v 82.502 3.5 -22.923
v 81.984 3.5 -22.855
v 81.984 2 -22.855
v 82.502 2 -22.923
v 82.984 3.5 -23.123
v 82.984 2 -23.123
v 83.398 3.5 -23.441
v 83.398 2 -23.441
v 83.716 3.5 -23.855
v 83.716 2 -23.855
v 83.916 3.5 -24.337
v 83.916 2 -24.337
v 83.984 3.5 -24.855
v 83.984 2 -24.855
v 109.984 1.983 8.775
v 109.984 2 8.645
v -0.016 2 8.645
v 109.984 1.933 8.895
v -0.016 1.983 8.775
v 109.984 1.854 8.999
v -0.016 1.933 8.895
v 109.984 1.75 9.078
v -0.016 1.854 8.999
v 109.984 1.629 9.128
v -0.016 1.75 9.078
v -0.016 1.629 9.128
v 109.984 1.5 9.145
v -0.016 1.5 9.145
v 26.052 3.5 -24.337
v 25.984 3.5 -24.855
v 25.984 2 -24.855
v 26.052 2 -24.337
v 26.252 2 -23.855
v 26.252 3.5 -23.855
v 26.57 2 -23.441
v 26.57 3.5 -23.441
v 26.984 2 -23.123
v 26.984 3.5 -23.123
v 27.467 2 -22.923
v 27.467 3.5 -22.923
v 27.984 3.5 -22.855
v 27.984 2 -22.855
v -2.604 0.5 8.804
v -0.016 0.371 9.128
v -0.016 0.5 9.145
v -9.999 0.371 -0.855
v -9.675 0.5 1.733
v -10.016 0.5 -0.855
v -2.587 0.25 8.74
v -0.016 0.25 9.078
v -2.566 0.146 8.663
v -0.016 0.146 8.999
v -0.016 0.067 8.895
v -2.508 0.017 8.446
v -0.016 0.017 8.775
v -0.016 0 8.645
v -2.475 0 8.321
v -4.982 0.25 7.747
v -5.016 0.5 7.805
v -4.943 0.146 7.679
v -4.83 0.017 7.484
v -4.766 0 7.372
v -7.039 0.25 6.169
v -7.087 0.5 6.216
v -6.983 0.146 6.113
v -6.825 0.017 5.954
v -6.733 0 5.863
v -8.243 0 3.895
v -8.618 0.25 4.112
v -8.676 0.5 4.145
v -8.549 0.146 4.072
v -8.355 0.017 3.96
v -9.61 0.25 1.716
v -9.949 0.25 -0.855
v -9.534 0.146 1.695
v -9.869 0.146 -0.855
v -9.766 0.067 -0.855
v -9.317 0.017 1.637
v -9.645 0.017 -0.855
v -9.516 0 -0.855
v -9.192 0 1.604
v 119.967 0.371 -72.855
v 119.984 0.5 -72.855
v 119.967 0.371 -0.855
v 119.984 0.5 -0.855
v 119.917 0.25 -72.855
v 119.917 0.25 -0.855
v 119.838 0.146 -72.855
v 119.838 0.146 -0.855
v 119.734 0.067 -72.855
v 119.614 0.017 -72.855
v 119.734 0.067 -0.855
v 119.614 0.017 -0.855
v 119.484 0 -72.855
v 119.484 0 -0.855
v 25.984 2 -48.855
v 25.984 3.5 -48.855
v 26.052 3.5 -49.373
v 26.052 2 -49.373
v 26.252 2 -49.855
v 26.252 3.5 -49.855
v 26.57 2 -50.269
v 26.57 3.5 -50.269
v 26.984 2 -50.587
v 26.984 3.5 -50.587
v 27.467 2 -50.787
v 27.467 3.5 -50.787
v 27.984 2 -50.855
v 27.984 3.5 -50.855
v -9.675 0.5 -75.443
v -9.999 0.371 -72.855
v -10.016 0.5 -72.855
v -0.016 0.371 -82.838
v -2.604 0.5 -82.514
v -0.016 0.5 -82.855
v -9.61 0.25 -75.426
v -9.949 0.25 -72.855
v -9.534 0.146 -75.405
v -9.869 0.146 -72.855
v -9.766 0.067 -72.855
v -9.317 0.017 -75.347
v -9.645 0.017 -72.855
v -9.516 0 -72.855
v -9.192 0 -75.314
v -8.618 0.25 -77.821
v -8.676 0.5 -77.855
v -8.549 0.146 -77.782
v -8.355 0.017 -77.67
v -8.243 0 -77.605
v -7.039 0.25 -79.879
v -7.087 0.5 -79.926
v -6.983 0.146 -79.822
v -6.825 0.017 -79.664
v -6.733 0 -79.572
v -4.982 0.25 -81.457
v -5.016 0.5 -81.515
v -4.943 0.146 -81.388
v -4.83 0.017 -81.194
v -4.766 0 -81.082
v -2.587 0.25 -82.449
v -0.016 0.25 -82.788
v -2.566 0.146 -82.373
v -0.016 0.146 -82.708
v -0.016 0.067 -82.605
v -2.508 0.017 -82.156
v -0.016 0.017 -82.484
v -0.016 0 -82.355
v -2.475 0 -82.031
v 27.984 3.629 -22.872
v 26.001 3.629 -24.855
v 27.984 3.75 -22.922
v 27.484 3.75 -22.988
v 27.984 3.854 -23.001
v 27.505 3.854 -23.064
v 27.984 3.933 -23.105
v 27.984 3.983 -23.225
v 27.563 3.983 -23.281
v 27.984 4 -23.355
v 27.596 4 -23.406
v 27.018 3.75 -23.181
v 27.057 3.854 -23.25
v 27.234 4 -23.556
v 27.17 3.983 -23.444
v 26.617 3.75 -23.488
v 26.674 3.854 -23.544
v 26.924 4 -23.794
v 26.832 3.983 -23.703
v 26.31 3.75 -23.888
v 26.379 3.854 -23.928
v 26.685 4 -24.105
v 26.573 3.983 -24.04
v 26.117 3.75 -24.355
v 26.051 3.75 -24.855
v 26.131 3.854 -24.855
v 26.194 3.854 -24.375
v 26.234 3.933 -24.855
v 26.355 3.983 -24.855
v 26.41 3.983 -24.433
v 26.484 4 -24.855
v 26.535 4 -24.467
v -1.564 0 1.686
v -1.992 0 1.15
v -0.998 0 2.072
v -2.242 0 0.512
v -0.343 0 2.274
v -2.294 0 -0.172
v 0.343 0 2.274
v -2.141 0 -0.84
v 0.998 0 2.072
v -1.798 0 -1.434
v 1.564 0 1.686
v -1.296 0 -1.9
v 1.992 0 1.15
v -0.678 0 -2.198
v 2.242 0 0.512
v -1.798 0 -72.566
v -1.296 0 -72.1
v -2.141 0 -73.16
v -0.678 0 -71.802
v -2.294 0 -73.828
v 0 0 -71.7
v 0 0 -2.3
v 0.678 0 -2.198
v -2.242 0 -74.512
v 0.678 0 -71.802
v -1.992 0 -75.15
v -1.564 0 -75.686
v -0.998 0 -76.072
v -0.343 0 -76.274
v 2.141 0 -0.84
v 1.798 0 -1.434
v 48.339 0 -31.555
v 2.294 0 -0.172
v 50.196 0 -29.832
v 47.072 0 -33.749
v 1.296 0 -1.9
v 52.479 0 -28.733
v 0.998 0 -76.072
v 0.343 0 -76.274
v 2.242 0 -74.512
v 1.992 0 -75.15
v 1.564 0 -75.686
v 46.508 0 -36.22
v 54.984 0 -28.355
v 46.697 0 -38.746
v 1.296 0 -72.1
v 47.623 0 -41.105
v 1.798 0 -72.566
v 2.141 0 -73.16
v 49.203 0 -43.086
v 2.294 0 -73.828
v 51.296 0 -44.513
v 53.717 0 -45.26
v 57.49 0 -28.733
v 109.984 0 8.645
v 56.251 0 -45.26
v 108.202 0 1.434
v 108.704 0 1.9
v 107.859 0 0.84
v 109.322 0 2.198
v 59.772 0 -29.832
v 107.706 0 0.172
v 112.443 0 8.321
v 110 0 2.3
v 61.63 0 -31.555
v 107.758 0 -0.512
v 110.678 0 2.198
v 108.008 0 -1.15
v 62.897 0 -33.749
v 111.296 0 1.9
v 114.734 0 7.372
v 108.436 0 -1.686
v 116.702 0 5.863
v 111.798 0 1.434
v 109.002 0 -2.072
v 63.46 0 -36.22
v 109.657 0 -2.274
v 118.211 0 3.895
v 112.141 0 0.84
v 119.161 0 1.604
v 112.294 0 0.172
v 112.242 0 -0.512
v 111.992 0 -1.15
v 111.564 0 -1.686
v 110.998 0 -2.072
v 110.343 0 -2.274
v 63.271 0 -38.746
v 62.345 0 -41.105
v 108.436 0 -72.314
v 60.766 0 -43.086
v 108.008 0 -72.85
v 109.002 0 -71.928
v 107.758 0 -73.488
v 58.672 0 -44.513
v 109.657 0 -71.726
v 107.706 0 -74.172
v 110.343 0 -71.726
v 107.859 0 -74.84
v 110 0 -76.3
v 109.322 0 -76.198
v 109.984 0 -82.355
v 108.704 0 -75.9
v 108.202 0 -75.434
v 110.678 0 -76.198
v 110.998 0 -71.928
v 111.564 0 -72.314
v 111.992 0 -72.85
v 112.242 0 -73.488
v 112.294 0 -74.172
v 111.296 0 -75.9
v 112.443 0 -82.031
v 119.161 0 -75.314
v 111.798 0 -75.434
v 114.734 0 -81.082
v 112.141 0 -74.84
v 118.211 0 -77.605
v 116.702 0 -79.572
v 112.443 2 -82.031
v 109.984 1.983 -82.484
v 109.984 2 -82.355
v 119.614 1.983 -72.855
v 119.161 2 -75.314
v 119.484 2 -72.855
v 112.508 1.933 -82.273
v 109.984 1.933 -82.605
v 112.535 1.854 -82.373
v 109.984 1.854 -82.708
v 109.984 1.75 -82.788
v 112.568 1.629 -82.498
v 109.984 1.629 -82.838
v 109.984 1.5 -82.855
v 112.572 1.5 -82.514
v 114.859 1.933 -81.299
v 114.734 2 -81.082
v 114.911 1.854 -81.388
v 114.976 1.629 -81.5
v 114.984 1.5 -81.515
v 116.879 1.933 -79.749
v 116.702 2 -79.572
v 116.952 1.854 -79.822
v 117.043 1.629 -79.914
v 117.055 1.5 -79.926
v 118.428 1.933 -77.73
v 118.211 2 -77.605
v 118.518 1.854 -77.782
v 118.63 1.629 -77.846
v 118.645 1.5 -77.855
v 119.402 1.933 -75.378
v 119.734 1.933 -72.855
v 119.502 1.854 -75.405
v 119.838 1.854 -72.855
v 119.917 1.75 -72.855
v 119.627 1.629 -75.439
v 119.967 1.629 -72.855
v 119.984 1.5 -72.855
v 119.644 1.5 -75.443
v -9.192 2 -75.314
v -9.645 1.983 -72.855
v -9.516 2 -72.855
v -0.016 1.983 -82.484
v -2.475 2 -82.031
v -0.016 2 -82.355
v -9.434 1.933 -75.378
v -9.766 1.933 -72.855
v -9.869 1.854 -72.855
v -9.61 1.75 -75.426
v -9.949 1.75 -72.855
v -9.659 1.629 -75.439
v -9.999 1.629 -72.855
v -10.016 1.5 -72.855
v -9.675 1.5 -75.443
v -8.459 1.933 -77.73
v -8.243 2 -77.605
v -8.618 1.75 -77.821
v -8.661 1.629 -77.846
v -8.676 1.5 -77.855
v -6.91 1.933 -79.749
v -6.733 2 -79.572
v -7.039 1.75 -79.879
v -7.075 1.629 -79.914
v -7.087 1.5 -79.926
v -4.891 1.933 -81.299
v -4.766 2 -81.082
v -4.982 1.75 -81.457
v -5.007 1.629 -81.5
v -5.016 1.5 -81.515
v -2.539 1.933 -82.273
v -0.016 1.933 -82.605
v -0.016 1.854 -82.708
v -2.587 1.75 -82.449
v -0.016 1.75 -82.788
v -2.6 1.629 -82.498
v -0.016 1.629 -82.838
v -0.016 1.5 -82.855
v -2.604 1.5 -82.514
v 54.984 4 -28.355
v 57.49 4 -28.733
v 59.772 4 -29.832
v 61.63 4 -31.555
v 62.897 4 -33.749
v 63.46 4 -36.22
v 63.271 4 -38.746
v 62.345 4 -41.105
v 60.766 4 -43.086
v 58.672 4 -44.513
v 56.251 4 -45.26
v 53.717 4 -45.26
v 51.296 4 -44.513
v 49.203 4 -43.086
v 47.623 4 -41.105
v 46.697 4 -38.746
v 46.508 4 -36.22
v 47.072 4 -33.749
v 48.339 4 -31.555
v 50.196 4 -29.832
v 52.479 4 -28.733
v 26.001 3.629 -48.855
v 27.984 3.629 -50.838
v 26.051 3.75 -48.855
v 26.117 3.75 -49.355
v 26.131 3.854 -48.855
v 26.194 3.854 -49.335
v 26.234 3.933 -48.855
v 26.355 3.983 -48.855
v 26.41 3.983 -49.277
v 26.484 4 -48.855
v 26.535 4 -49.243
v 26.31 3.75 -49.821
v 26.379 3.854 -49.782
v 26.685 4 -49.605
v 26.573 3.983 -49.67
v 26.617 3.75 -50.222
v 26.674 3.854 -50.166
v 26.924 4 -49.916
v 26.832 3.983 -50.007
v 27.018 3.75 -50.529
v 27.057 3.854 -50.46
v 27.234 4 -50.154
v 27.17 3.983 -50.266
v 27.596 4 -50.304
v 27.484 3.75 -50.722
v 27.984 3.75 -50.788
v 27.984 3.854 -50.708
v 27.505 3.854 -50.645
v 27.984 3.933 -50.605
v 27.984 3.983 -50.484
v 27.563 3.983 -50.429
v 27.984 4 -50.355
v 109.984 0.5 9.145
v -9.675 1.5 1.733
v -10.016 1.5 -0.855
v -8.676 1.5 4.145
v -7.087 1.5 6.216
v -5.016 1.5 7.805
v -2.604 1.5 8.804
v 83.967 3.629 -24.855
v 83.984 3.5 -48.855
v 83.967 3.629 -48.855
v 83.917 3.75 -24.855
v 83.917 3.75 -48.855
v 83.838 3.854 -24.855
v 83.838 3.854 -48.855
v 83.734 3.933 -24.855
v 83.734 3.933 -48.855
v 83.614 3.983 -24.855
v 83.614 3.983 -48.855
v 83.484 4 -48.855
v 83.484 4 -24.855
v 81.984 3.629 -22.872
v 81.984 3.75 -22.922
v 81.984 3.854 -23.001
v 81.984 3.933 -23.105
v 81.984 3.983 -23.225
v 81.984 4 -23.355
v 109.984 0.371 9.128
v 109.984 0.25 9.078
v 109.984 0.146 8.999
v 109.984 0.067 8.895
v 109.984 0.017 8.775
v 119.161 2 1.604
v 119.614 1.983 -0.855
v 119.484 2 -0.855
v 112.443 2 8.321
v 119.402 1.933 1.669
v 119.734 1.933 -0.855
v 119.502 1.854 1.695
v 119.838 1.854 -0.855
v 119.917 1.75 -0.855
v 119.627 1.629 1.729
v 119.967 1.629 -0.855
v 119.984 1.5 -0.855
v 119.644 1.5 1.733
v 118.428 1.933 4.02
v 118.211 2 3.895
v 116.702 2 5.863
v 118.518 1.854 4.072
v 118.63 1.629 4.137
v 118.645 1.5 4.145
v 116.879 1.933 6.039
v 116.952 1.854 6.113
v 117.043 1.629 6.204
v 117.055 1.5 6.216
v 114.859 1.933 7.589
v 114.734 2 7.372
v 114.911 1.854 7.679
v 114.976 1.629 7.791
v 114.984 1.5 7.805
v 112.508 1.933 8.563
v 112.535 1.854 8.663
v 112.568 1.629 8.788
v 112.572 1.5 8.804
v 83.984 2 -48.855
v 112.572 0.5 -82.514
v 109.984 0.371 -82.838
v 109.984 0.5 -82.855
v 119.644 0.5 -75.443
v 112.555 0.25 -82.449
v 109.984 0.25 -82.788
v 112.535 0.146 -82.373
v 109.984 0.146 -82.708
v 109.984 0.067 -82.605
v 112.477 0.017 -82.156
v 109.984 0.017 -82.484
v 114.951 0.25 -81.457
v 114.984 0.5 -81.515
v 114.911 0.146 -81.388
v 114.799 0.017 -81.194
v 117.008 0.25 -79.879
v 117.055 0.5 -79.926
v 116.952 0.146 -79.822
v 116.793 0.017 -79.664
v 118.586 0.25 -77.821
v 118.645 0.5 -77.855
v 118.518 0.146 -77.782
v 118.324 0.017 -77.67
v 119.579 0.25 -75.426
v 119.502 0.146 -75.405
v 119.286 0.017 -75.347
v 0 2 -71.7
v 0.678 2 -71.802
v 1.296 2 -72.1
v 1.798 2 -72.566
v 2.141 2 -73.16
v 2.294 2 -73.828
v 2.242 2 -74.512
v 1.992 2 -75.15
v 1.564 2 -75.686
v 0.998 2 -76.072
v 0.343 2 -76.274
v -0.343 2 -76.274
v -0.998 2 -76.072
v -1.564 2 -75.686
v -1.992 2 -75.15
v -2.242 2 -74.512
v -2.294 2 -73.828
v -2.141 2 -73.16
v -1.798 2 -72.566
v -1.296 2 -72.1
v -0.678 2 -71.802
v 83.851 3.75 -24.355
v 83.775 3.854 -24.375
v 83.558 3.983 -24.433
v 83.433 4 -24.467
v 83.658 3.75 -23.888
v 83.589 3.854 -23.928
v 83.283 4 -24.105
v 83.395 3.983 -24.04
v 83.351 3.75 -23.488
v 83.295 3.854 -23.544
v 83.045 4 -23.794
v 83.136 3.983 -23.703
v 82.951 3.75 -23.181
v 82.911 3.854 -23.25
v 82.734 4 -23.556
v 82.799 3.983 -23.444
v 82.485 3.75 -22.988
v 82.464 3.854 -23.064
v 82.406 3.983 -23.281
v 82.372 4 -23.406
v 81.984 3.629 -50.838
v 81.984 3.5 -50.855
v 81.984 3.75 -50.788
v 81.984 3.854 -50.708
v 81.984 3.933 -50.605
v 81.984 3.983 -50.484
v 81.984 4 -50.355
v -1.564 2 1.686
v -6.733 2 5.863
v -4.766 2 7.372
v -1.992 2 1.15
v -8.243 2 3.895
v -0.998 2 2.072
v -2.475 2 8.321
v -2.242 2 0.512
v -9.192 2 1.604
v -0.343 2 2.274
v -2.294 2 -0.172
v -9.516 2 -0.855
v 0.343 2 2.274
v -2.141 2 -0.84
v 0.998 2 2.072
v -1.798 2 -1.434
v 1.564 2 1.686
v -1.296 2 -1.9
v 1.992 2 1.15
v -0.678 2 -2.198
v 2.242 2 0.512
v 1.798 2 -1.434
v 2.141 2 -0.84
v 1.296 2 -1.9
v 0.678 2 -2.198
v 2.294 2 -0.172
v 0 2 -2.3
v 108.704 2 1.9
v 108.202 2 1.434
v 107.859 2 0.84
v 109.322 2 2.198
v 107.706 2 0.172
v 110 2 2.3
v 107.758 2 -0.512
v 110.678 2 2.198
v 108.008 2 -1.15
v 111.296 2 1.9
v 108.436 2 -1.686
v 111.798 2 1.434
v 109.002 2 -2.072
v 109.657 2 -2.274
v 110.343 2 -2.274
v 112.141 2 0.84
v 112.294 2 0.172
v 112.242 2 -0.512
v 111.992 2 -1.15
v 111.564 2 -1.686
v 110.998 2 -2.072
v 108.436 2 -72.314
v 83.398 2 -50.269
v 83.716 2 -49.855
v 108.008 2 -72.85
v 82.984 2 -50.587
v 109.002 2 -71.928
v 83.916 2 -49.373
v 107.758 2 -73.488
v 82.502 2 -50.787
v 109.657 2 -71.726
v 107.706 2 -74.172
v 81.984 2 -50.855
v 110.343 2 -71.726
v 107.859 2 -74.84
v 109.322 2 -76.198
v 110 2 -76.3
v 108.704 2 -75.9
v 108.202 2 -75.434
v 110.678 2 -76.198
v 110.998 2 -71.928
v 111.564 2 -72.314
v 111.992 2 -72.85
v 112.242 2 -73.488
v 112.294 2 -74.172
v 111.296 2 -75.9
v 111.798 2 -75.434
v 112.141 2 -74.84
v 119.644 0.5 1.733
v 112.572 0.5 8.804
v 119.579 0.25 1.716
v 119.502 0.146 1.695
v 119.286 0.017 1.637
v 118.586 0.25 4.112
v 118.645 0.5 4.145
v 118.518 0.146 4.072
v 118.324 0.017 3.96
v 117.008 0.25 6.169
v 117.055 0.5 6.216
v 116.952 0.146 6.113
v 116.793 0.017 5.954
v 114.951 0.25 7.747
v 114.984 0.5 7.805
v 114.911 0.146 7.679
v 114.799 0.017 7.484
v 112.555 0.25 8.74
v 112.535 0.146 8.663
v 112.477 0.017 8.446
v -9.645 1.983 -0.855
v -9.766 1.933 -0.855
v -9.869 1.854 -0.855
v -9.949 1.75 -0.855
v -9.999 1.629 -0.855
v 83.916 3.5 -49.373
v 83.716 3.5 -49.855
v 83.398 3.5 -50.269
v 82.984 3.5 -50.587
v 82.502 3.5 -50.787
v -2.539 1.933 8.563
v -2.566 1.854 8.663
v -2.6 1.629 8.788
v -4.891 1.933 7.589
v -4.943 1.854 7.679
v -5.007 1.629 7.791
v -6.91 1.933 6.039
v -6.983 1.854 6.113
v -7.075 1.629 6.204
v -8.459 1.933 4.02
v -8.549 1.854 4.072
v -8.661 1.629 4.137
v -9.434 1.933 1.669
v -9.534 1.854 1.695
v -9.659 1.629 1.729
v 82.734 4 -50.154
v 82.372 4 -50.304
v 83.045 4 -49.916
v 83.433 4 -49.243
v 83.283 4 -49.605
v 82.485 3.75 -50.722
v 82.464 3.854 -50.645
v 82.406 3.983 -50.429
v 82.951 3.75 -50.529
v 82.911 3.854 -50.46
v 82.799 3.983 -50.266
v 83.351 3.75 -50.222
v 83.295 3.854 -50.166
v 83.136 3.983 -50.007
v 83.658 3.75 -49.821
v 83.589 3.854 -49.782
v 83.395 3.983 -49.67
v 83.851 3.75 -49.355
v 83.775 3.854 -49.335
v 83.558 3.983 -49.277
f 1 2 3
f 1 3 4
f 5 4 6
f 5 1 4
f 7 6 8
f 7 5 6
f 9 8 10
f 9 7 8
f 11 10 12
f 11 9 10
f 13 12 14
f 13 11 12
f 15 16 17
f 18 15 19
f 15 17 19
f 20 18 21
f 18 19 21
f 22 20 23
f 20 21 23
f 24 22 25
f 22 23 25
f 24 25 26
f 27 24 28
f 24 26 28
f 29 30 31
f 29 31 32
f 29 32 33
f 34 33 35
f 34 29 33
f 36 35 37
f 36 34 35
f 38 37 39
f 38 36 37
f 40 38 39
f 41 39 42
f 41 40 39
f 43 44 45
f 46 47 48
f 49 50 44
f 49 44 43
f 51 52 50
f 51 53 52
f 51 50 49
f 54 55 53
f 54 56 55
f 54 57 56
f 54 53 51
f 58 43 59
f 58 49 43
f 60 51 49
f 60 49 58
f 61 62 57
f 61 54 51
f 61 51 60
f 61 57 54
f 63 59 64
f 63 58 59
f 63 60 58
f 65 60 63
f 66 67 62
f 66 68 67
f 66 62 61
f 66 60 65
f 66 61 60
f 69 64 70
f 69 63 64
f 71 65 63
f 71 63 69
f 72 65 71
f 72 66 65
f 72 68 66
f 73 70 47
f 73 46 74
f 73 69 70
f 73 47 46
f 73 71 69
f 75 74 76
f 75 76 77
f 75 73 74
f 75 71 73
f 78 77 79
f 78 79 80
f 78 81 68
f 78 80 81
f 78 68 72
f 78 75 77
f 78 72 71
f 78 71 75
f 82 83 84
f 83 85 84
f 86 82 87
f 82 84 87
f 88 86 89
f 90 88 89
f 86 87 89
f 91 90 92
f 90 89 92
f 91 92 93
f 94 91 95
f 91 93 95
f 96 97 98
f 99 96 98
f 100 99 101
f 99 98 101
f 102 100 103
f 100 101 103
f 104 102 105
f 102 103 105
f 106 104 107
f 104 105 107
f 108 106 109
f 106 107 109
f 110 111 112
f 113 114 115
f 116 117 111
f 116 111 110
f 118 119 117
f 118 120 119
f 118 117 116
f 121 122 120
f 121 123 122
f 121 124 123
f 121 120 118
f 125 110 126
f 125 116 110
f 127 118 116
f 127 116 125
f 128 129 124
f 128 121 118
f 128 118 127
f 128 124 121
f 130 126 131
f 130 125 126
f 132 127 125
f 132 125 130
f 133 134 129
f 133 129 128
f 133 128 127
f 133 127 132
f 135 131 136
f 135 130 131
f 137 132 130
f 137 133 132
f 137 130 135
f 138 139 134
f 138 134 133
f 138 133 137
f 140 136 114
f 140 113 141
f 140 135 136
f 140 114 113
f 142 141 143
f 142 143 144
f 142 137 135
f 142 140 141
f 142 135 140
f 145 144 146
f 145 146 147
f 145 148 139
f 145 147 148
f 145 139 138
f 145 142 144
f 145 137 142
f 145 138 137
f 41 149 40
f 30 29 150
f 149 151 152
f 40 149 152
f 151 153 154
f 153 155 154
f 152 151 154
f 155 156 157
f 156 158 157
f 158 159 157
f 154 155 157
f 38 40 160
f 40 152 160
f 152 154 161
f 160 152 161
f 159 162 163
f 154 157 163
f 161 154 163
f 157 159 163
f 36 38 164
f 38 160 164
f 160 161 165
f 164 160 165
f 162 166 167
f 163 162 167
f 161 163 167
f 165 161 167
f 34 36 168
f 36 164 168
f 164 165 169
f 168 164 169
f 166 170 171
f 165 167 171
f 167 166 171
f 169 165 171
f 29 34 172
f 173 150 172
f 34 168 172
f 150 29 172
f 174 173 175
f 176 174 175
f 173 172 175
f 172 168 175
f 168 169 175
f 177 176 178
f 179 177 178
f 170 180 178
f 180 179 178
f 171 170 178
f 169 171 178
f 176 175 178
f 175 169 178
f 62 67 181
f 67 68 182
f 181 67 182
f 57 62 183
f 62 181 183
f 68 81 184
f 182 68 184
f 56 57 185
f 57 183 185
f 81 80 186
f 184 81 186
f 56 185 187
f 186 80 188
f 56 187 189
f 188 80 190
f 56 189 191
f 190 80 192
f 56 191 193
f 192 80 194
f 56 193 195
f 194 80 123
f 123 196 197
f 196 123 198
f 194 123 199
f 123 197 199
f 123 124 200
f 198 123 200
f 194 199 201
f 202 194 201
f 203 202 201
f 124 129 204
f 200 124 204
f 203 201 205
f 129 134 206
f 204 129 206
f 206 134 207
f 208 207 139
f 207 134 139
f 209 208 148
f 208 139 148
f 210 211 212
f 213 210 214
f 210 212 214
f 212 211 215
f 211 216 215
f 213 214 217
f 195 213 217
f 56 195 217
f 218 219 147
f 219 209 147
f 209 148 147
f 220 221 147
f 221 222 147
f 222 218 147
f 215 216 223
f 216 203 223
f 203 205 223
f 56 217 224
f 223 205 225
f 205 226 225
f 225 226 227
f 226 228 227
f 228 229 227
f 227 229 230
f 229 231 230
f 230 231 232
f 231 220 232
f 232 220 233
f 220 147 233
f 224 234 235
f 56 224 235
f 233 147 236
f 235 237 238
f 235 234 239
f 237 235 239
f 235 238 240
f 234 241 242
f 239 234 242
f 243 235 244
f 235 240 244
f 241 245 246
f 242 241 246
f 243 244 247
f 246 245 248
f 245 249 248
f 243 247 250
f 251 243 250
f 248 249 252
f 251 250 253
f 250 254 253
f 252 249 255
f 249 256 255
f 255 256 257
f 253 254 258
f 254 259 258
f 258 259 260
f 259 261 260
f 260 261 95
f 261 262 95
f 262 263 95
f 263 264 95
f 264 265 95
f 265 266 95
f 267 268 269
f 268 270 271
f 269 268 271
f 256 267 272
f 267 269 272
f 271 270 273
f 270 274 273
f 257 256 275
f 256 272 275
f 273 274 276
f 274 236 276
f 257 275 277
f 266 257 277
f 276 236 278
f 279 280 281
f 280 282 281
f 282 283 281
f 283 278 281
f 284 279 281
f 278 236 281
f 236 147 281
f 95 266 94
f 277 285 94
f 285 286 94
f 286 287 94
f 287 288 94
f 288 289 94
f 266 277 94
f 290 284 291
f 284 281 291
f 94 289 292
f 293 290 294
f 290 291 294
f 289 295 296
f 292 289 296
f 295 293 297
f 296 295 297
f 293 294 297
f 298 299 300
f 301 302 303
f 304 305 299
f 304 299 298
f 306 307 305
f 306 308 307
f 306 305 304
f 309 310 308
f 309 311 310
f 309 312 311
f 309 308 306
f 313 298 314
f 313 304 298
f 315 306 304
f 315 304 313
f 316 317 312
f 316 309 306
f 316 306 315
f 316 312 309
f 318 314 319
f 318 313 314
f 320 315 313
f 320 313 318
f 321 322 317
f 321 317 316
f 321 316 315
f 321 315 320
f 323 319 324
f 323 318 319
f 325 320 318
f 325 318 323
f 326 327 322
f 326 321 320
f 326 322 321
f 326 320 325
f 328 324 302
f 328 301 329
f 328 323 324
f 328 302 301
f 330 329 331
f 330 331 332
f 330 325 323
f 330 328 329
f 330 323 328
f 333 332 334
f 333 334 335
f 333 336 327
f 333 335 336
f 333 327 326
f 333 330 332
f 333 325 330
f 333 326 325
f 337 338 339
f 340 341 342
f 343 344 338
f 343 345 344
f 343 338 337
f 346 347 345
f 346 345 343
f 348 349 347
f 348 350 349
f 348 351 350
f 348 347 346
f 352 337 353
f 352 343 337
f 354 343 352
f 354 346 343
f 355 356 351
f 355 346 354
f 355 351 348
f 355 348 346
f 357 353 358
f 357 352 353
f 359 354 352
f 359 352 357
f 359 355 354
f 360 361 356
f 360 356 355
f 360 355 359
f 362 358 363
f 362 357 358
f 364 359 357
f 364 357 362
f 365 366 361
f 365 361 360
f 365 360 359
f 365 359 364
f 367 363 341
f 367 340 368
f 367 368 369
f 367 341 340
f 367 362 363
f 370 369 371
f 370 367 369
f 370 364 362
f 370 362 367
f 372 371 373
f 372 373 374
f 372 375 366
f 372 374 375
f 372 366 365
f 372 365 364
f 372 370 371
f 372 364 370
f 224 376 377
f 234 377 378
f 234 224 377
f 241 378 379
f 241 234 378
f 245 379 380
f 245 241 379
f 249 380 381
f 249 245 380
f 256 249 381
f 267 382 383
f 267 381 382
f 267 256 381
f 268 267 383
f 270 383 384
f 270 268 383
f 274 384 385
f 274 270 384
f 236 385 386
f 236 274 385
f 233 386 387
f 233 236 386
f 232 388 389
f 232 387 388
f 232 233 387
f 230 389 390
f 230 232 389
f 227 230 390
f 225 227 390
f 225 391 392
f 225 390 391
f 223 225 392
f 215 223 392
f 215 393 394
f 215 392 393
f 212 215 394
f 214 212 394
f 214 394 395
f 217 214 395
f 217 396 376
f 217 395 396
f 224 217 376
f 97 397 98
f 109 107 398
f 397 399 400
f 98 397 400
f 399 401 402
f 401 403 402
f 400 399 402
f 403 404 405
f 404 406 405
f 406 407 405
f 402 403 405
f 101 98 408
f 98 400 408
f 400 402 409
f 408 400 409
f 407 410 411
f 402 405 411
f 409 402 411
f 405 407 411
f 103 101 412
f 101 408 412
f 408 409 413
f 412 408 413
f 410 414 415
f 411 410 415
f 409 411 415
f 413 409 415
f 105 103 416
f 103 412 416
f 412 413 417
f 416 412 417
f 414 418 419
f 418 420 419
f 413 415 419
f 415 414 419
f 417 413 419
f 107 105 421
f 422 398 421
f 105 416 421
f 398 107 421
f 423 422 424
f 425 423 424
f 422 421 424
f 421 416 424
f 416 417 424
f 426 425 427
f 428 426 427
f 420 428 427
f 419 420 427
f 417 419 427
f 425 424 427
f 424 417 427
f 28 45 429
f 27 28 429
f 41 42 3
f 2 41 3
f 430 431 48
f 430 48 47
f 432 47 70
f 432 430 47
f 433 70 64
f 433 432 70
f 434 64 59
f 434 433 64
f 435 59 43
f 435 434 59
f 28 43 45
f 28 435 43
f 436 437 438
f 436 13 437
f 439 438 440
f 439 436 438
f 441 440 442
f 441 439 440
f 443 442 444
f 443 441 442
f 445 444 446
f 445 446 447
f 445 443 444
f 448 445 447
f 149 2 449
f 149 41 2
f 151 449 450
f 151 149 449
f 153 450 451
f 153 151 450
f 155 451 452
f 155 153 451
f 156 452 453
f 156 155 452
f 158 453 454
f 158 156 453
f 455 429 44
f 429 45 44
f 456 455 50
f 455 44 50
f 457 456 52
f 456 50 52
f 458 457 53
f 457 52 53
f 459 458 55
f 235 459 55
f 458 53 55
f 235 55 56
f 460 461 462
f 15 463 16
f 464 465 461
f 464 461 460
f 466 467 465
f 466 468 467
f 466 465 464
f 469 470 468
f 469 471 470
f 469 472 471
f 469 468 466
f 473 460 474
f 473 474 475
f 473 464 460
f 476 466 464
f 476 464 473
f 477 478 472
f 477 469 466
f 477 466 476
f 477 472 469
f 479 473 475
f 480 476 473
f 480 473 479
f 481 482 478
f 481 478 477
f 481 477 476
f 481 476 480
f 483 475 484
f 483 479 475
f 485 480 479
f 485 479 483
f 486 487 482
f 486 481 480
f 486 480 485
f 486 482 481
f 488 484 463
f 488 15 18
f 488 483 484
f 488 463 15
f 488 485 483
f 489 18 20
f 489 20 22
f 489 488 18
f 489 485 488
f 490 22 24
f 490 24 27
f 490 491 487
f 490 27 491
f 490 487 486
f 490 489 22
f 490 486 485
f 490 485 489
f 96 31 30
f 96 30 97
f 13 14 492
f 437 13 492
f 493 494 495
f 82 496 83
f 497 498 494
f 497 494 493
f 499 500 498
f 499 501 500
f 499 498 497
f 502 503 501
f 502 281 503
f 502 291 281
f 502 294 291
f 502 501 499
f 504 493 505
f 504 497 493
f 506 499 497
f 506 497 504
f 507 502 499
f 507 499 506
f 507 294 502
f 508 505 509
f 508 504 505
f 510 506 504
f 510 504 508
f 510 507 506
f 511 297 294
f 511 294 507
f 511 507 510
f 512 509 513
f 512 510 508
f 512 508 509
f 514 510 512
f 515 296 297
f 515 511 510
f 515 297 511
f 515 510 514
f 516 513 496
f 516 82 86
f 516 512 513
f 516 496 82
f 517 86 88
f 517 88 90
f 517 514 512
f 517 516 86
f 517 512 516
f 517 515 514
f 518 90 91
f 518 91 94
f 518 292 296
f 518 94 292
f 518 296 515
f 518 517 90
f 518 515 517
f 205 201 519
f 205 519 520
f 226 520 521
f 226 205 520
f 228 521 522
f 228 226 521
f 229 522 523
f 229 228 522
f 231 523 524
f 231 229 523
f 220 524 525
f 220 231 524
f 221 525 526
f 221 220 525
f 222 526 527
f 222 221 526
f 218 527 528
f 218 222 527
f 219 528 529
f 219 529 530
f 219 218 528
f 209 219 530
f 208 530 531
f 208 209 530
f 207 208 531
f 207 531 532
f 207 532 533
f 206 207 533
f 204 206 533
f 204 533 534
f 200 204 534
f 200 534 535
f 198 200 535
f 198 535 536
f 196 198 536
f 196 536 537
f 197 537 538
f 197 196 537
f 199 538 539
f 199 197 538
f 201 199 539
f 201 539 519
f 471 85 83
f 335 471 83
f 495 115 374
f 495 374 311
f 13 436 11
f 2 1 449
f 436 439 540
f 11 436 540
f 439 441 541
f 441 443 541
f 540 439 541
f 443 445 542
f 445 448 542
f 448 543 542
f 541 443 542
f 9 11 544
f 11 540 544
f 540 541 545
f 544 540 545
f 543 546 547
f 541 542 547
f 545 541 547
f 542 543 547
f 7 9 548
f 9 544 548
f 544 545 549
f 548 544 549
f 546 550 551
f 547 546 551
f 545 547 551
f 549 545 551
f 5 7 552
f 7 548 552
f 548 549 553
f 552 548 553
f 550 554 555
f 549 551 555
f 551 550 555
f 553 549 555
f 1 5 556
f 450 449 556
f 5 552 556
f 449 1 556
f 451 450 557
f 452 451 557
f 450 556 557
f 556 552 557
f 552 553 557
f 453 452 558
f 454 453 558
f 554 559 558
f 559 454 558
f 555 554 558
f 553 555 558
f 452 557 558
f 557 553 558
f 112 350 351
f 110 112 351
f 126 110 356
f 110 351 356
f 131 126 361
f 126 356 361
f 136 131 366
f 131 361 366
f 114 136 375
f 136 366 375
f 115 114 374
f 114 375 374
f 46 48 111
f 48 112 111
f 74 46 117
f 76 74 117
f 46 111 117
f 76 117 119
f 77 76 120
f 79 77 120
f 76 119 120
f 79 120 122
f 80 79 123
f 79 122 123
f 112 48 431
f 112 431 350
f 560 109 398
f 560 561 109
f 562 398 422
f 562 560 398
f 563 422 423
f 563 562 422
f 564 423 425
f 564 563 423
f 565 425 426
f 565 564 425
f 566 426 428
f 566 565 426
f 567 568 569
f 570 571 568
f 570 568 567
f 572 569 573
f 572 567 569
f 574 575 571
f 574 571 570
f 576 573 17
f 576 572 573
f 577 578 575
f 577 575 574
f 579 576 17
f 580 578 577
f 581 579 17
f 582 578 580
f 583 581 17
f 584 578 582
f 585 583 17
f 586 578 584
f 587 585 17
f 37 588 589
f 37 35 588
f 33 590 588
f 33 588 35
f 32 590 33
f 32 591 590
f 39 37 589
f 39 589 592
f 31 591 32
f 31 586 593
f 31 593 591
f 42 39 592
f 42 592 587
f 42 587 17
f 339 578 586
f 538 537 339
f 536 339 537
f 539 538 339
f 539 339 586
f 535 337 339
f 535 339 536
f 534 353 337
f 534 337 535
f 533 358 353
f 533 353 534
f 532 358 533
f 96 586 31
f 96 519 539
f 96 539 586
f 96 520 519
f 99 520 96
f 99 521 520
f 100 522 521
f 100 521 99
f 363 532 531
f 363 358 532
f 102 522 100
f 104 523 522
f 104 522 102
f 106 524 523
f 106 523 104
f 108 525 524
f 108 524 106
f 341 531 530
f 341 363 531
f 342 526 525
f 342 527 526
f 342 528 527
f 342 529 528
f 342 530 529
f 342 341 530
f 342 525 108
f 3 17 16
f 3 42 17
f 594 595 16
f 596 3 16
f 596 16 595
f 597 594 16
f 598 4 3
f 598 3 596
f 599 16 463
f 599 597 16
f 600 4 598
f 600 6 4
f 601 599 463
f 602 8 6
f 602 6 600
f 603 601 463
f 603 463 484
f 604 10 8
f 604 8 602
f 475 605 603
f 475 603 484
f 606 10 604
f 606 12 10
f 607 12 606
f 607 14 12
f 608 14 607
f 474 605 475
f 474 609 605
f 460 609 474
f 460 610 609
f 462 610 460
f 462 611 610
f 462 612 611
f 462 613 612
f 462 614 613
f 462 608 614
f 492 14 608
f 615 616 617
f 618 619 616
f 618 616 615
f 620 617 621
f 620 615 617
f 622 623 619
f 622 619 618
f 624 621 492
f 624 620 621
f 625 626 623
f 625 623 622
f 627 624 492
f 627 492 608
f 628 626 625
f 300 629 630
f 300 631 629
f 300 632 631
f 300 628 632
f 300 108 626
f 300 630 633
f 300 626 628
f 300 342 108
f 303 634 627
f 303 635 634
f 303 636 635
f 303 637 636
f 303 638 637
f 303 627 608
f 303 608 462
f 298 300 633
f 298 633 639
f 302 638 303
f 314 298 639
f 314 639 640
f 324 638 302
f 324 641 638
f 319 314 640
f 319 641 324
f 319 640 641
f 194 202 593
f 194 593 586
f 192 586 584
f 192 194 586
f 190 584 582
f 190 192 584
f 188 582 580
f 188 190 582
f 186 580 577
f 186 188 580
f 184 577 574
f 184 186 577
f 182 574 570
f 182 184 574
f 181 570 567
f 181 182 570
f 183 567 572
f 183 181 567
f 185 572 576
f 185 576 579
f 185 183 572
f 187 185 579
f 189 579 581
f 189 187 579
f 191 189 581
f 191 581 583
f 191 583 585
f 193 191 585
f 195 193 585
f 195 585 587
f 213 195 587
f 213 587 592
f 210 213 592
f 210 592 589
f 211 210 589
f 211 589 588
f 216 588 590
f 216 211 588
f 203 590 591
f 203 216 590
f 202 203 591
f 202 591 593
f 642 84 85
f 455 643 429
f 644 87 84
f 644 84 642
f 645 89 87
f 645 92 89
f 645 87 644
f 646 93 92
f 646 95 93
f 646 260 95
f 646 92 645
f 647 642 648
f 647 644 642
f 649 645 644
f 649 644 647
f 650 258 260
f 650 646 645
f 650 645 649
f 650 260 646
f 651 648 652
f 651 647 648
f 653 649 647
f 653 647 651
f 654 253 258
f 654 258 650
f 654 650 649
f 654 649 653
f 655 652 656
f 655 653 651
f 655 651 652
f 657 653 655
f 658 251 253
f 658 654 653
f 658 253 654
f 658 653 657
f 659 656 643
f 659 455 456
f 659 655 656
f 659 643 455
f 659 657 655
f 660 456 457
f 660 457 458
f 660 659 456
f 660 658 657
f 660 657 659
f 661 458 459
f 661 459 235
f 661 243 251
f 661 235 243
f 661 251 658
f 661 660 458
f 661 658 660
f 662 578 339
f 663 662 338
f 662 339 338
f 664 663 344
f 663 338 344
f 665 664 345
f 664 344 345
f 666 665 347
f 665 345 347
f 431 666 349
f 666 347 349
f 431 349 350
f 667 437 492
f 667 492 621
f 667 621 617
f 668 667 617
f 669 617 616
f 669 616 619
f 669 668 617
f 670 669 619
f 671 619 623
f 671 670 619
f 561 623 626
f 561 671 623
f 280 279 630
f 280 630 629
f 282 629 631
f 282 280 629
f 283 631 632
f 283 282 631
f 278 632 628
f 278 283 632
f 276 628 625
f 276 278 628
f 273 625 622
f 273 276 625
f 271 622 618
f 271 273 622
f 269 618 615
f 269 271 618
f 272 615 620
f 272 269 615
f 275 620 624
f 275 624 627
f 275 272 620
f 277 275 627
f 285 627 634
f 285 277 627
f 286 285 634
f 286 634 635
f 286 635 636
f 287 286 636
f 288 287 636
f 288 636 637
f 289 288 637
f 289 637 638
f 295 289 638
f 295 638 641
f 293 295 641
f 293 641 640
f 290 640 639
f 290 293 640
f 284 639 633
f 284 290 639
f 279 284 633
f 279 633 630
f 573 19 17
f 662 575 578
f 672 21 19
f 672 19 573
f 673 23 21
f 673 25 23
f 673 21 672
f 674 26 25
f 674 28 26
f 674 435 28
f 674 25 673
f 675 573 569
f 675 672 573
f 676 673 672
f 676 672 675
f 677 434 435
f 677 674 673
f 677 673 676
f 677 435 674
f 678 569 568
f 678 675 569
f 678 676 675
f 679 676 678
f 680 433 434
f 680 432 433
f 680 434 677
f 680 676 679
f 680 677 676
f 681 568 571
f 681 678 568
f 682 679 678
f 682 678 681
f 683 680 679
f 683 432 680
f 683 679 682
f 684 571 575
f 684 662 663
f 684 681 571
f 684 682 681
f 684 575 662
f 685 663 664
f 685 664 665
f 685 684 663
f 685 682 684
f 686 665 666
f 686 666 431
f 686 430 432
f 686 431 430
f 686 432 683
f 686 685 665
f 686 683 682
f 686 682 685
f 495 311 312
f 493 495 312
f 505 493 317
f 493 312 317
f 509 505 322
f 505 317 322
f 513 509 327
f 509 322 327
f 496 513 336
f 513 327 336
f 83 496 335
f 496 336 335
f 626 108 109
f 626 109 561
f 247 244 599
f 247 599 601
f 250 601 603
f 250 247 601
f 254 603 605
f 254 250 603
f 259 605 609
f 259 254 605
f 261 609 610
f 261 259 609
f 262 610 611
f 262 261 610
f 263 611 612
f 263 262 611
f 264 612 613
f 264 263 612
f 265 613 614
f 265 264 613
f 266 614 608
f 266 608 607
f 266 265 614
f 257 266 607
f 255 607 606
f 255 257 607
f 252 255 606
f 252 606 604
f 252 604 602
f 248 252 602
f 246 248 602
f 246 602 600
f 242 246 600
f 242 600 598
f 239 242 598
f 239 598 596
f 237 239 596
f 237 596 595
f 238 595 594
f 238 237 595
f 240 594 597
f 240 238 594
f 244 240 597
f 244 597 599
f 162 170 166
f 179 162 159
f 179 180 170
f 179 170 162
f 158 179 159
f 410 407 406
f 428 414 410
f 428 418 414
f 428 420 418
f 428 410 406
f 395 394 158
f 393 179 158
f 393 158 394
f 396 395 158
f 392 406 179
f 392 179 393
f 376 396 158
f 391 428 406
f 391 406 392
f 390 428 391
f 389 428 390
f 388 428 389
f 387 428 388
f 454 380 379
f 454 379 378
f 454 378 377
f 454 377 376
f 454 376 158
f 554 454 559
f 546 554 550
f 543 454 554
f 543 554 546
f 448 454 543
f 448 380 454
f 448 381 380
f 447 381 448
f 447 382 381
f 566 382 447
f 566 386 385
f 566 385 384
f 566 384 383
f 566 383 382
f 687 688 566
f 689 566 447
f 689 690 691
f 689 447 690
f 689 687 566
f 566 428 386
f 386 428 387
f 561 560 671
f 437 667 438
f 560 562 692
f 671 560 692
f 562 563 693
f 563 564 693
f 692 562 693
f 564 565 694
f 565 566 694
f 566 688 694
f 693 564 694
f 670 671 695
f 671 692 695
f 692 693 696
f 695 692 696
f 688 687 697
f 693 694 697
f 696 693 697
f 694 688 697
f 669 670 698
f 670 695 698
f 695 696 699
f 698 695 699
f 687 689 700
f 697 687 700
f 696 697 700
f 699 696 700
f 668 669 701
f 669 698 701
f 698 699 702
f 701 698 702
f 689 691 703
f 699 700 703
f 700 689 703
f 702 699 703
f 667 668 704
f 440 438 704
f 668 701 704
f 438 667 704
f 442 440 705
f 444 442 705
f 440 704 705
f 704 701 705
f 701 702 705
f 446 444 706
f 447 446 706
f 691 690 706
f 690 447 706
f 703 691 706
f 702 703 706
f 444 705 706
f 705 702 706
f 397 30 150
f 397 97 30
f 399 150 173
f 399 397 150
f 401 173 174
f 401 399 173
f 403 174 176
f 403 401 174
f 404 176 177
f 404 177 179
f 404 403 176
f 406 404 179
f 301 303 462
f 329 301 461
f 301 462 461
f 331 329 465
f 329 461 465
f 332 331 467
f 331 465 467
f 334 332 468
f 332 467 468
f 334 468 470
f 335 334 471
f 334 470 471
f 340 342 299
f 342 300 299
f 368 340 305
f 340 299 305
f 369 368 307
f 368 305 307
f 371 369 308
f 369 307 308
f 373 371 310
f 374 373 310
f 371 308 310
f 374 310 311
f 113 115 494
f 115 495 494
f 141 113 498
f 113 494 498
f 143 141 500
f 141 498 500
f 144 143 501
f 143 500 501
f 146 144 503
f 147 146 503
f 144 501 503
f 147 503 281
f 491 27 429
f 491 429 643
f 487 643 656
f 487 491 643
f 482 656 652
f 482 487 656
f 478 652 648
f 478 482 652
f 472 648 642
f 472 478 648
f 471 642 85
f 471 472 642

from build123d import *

# Parameters (mm, degrees)
SKETCH1_W           = 130
SKETCH1_H           = 92
SKETCH1_R           = 2.3
BOSS_EXTRUDE1_DEPTH = 2
SKETCH2_W           = 58
SKETCH2_H           = 28
BOSS_EXTRUDE2_DEPTH = 4
FILLET1_R           = 10
FILLET2_R           = 2
FILLET3_R           = 0.5
SKETCH3_R           = 8.5
CUT_EXTRUDE1_DEPTH  = 146.86690412


with BuildPart() as part:
    # Sketch1 → Boss-Extrude1 (new body)
    with BuildSketch(Plane(origin=(0, 0, 0), x_dir=(1, 0, 0), z_dir=(0, 1, 0))):
        with Locations((54.9842552, 36.854886379)):
            Rectangle(SKETCH1_W, SKETCH1_H)
        with Locations(Location((0, 74, 0), (0, 0, 270))):
            Circle(SKETCH1_R, mode=Mode.SUBTRACT)
        with Locations(Location((110, 74, 0), (0, 0, 90))):
            Circle(SKETCH1_R, mode=Mode.SUBTRACT)
        with Locations(Location((110, 0, 0), (0, 0, 270))):
            Circle(SKETCH1_R, mode=Mode.SUBTRACT)
        with Locations(Location((0, 0, 0), (0, 0, 90))):
            Circle(SKETCH1_R, mode=Mode.SUBTRACT)
    extrude(amount=BOSS_EXTRUDE1_DEPTH)

    # Sketch2 → Boss-Extrude2 (add)
    with BuildSketch(Plane(origin=(0, 0, 0), x_dir=(1, 0, 0), z_dir=(0, 1, 0))):
        with Locations((54.9842552, 36.854886379)):
            Rectangle(SKETCH2_W, SKETCH2_H)
    extrude(amount=BOSS_EXTRUDE2_DEPTH)

    # Fillet1
    fillet1_edges = [part.edges().sort_by_distance(p)[0] for p in [
        (-10.0157448, 1, -82.854886379),
        (119.9842552, 1, -82.854886379),
        (119.9842552, 1, 9.145113621),
        (-10.0157448, 1, 9.145113621),
    ]]
    fillet(fillet1_edges, radius=FILLET1_R)

    # Fillet2
    fillet2_edges = [part.edges().sort_by_distance(p)[0] for p in [
        (25.9842552, 3, -50.854886379),
        (25.9842552, 3, -22.854886379),
        (83.9842552, 3, -22.854886379),
        (83.9842552, 3, -50.854886379),
    ]]
    fillet(fillet2_edges, radius=FILLET2_R)

    # Fillet3
    fillet3_edges = [part.edges().sort_by_distance(p)[0] for p in [
        (54.9842552, 0, -82.854886379),
        (54.9842552, 2, -82.854886379),
        (-10.0157448, 0, -36.854886379),
        (119.9842552, 0, -36.854886379),
        (54.9842552, 0, 9.145113621),
        (-7.086812612, 0, -79.925954191),
        (-7.086812612, 0, 6.216181433),
        (117.055323011, 0, 6.216181433),
        (117.055323011, 0, -79.925954191),
        (119.9842552, 2, -36.854886379),
        (-10.0157448, 2, -36.854886379),
        (54.9842552, 2, 9.145113621),
        (-7.086812612, 2, -79.925954191),
        (-7.086812612, 2, 6.216181433),
        (117.055323011, 2, 6.216181433),
        (117.055323011, 2, -79.925954191),
        (25.9842552, 4, -36.854886379),
        (54.9842552, 4, -50.854886379),
        (54.9842552, 4, -22.854886379),
        (83.9842552, 4, -36.854886379),
        (26.570041637, 4, -23.440672817),
        (83.398468762, 4, -23.440672817),
        (83.398468762, 4, -50.269099942),
        (26.570041637, 4, -50.269099942),
    ]]
    fillet(fillet3_edges, radius=FILLET3_R)

    # Sketch3 → Cut-Extrude1 (cut, through all)
    with BuildSketch(Plane(origin=(0, 0, 0), x_dir=(1, 0, 0), z_dir=(0, 1, 0))):
        with Locations(Location((54.9842552, 36.854886379, 0), (0, 0, 270))):
            Circle(SKETCH3_R)
    extrude(amount=CUT_EXTRUDE1_DEPTH, mode=Mode.SUBTRACT)


solid = part.part
